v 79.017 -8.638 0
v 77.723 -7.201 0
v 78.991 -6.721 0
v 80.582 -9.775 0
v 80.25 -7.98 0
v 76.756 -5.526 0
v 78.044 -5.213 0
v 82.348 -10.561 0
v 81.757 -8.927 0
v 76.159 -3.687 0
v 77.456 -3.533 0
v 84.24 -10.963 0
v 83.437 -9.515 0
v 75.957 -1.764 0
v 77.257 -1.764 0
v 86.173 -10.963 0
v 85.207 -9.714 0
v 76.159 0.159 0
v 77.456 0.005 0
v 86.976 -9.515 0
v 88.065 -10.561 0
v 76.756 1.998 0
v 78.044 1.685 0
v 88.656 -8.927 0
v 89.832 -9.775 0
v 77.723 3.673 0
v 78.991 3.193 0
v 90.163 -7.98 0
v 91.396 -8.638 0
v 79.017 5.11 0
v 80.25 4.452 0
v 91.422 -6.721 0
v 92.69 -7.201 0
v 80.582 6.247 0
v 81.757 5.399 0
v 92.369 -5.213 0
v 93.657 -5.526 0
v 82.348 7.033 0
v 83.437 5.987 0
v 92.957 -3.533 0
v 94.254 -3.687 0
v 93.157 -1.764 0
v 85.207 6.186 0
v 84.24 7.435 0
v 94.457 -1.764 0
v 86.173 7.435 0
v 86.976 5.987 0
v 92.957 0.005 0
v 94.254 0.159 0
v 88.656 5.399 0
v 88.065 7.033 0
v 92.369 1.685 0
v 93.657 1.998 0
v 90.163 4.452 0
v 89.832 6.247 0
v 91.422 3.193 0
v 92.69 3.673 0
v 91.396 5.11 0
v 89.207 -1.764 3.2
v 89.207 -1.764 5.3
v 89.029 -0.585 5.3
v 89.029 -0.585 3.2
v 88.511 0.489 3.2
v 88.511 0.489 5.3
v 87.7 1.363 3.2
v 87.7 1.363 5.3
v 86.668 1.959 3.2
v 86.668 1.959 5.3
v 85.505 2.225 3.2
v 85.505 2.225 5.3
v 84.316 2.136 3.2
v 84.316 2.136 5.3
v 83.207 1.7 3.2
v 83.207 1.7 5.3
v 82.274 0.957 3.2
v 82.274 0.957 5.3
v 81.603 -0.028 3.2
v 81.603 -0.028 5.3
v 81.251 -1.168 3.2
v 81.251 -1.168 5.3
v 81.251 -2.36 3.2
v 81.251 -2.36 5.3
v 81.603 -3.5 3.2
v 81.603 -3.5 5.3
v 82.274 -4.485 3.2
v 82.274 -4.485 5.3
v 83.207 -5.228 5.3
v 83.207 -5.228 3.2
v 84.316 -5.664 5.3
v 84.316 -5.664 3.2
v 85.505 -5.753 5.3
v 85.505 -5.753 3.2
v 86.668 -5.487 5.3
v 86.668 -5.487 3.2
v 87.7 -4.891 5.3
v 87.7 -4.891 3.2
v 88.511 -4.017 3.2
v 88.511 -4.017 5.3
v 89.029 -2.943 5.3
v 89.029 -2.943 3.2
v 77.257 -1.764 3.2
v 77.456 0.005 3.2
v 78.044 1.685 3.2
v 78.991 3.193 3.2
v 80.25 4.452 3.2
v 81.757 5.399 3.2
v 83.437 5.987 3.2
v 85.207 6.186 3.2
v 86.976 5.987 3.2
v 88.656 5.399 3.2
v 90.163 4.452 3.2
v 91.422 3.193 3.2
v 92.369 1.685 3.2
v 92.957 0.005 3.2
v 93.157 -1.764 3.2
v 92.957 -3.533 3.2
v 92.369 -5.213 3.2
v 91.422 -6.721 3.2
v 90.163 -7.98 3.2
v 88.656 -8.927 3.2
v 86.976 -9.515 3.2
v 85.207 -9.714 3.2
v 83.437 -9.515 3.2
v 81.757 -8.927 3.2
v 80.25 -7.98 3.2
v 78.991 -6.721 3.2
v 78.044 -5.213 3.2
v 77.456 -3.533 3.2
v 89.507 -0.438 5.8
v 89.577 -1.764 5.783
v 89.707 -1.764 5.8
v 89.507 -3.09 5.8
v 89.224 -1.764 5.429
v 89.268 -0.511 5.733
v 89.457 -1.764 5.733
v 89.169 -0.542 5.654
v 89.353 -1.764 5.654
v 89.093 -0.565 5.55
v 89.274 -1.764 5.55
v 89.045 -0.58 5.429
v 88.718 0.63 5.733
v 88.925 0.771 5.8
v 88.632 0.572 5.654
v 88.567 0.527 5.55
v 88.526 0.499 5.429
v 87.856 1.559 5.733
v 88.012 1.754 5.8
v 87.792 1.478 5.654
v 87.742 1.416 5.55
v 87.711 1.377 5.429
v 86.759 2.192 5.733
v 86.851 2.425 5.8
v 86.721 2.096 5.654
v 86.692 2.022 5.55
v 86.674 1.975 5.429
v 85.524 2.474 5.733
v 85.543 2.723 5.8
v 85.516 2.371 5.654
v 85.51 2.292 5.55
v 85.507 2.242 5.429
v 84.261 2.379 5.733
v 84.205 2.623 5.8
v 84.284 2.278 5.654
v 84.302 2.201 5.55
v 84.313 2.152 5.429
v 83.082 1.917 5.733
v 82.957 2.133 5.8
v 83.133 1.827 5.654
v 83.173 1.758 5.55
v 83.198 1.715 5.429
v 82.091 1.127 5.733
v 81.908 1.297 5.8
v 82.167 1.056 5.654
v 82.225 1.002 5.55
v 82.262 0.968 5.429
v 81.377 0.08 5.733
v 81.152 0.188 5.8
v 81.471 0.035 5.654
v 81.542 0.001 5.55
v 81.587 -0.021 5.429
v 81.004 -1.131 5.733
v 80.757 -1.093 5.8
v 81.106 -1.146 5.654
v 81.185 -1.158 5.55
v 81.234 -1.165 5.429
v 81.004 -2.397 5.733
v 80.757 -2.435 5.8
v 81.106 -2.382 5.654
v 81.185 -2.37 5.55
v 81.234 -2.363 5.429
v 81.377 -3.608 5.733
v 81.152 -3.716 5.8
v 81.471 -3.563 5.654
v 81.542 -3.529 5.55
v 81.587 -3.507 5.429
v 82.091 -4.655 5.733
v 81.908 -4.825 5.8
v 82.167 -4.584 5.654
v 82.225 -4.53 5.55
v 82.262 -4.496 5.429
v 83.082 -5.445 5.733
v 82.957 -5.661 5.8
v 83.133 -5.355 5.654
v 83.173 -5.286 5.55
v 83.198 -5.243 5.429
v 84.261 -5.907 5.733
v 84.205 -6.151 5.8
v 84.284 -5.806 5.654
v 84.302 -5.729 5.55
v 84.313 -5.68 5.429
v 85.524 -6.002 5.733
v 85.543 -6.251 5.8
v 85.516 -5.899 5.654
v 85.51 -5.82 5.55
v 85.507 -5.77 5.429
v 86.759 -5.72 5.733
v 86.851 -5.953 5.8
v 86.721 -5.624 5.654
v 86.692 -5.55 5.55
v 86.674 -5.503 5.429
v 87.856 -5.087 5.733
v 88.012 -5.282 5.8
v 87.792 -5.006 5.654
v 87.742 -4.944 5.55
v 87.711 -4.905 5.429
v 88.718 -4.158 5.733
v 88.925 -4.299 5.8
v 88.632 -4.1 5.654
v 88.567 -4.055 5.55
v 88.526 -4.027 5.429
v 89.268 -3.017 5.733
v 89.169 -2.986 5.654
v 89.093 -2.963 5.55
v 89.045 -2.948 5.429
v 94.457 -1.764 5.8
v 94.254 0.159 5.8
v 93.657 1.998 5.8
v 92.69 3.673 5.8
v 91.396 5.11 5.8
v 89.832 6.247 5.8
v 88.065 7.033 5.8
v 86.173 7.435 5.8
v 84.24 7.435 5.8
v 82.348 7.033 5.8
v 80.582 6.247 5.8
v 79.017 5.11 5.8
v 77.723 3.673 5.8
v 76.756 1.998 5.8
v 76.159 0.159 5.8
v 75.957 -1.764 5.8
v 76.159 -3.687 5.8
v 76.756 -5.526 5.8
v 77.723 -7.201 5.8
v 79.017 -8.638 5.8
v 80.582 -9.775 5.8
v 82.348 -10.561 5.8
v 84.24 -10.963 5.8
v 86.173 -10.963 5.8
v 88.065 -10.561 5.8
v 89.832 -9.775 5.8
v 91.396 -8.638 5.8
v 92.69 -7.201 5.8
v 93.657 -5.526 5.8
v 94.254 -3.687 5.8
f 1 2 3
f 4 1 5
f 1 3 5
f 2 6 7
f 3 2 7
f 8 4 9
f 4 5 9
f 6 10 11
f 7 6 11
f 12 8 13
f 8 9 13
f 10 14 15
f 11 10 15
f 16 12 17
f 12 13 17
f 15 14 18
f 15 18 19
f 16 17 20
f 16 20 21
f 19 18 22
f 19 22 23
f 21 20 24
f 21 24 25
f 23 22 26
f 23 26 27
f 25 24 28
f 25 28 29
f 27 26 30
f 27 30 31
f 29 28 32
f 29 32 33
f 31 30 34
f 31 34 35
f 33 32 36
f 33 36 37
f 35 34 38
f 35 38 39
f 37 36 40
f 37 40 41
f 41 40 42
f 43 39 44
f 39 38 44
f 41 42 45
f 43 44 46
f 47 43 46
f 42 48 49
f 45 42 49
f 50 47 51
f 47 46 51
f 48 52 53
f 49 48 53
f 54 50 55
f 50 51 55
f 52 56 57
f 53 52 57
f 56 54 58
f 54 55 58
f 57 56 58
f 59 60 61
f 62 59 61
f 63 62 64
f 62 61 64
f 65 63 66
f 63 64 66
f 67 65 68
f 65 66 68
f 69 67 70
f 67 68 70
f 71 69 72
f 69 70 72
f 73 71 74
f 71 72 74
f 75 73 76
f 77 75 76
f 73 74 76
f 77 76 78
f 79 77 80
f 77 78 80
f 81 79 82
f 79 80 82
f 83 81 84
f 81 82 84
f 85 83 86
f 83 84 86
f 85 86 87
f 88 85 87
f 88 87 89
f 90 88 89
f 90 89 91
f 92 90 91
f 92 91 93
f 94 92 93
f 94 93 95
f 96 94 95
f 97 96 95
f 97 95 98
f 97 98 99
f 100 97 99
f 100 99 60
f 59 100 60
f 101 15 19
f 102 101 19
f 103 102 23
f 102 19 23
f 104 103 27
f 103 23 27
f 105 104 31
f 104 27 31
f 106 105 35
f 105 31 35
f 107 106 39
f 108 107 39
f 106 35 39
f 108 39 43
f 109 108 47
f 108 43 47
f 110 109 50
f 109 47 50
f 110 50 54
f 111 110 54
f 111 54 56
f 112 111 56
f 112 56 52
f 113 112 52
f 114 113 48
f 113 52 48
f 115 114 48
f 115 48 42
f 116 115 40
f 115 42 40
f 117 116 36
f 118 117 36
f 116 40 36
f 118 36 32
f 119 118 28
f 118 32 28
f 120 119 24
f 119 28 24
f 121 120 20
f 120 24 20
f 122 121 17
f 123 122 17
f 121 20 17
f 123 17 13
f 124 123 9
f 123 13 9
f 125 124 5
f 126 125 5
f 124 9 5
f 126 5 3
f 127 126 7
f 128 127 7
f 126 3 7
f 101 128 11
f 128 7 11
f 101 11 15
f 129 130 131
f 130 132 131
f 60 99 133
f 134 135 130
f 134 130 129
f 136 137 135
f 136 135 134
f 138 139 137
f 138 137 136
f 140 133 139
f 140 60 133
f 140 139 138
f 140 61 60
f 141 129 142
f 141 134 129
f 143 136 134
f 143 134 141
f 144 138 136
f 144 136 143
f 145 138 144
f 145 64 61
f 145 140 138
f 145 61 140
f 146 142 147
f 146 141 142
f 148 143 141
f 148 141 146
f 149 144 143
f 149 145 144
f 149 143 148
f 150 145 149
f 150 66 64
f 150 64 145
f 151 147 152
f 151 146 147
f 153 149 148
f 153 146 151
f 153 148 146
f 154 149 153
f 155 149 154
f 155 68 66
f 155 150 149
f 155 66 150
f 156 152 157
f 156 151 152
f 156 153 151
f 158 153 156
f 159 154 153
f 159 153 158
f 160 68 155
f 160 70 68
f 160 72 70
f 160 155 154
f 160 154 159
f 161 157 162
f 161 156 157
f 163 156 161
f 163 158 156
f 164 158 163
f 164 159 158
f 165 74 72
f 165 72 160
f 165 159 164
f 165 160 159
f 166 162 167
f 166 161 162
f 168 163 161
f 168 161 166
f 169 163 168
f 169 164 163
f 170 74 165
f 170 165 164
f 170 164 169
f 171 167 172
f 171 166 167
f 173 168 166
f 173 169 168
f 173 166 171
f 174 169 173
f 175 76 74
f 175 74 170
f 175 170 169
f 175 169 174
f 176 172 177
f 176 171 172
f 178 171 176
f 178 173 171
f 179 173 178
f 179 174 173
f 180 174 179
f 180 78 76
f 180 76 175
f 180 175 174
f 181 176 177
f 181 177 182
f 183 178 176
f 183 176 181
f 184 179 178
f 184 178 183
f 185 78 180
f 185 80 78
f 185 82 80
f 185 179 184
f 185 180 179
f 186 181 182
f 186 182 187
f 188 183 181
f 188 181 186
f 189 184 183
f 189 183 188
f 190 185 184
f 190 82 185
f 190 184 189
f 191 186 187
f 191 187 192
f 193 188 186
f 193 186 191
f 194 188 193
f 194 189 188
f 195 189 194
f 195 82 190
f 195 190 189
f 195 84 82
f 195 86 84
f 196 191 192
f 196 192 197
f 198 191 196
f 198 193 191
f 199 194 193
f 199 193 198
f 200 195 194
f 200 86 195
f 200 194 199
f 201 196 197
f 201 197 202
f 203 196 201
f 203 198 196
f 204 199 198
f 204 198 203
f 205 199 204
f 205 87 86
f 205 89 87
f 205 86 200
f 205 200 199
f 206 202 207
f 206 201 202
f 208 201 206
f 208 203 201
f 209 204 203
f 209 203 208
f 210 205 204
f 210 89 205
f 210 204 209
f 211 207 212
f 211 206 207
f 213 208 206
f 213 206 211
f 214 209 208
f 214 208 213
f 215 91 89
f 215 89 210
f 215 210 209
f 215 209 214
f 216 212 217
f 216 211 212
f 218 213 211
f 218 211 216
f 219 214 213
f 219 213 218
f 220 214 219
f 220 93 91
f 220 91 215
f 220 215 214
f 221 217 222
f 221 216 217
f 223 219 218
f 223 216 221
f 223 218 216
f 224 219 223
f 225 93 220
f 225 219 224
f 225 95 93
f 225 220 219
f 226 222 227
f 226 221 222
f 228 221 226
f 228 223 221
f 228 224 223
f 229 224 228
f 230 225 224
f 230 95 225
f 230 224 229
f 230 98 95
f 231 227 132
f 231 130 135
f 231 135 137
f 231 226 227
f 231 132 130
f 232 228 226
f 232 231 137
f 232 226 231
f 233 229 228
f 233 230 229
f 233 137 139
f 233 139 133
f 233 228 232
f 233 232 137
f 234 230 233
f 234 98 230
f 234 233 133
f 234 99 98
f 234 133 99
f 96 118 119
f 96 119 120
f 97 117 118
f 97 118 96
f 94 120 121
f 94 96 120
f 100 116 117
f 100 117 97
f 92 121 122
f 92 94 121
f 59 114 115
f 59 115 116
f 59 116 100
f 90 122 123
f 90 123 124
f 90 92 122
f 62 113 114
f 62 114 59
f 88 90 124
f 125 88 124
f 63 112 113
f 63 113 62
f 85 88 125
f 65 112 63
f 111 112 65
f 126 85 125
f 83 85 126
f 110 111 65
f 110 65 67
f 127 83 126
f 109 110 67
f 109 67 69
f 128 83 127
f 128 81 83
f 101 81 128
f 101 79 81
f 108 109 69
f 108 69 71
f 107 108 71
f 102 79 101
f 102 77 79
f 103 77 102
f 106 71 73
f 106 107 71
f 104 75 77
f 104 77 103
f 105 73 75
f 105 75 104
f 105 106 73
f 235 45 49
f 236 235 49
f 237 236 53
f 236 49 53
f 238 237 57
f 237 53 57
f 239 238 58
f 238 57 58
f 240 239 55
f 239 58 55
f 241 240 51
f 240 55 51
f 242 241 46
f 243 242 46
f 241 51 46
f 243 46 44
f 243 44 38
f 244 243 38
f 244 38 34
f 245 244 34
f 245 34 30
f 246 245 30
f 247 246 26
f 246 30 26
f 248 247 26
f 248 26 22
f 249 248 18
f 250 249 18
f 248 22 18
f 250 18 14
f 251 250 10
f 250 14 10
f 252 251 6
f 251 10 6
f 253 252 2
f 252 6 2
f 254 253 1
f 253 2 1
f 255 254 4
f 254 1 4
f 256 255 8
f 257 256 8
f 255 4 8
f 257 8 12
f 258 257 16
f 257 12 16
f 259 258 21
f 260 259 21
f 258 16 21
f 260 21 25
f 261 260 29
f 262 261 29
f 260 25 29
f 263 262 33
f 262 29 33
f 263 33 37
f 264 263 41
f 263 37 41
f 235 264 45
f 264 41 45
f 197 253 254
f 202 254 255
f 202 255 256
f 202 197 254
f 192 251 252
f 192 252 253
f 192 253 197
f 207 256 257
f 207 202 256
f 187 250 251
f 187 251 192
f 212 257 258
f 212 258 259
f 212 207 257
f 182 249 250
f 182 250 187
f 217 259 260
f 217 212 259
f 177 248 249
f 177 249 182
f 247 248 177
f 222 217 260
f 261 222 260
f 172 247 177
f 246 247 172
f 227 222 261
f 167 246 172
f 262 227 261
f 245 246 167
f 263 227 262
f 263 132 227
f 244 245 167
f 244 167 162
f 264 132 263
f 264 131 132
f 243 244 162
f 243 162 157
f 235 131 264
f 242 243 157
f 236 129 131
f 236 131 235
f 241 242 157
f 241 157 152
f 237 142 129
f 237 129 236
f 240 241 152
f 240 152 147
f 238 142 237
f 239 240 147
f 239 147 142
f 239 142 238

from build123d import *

# Parameters (mm, degrees)
SKETCH1_R           = 9.25
BOSS_EXTRUDE1_DEPTH = 5.8
SKETCH2_R           = 4
CUT_EXTRUDE1_DEPTH  = 96.273205671
SKETCH3_R           = 7.95
CUT_EXTRUDE2_DEPTH  = 3.2
FILLET1_R           = 0.5


with BuildPart() as part:
    # Sketch1 → Boss-Extrude1 (new body)
    with BuildSketch(Plane.XY):
        with Locations((85.206527413, -1.763997815)):
            Circle(SKETCH1_R)
    extrude(amount=BOSS_EXTRUDE1_DEPTH)

    # Sketch2 → Cut-Extrude1 (cut, through all)
    with BuildSketch(Plane.XY.offset(5.8)):
        with Locations((85.206527413, -1.763997815)):
            Circle(SKETCH2_R)
    extrude(amount=-CUT_EXTRUDE1_DEPTH, mode=Mode.SUBTRACT)

    # Sketch3 → Cut-Extrude2 (cut)
    with BuildSketch(Plane(origin=(0, 0, 0), x_dir=(-1, 0, 0), z_dir=(0, 0, -1))):
        with Locations((-85.206527413, -1.763997815)):
            Circle(SKETCH3_R)
    extrude(amount=-CUT_EXTRUDE2_DEPTH, mode=Mode.SUBTRACT)

    # Fillet1
    fillet1_edges = [part.edges().sort_by_distance(p)[0] for p in [
        (81.206527413, -1.763997815, 5.8),
    ]]
    fillet(fillet1_edges, radius=FILLET1_R)


solid = part.part
